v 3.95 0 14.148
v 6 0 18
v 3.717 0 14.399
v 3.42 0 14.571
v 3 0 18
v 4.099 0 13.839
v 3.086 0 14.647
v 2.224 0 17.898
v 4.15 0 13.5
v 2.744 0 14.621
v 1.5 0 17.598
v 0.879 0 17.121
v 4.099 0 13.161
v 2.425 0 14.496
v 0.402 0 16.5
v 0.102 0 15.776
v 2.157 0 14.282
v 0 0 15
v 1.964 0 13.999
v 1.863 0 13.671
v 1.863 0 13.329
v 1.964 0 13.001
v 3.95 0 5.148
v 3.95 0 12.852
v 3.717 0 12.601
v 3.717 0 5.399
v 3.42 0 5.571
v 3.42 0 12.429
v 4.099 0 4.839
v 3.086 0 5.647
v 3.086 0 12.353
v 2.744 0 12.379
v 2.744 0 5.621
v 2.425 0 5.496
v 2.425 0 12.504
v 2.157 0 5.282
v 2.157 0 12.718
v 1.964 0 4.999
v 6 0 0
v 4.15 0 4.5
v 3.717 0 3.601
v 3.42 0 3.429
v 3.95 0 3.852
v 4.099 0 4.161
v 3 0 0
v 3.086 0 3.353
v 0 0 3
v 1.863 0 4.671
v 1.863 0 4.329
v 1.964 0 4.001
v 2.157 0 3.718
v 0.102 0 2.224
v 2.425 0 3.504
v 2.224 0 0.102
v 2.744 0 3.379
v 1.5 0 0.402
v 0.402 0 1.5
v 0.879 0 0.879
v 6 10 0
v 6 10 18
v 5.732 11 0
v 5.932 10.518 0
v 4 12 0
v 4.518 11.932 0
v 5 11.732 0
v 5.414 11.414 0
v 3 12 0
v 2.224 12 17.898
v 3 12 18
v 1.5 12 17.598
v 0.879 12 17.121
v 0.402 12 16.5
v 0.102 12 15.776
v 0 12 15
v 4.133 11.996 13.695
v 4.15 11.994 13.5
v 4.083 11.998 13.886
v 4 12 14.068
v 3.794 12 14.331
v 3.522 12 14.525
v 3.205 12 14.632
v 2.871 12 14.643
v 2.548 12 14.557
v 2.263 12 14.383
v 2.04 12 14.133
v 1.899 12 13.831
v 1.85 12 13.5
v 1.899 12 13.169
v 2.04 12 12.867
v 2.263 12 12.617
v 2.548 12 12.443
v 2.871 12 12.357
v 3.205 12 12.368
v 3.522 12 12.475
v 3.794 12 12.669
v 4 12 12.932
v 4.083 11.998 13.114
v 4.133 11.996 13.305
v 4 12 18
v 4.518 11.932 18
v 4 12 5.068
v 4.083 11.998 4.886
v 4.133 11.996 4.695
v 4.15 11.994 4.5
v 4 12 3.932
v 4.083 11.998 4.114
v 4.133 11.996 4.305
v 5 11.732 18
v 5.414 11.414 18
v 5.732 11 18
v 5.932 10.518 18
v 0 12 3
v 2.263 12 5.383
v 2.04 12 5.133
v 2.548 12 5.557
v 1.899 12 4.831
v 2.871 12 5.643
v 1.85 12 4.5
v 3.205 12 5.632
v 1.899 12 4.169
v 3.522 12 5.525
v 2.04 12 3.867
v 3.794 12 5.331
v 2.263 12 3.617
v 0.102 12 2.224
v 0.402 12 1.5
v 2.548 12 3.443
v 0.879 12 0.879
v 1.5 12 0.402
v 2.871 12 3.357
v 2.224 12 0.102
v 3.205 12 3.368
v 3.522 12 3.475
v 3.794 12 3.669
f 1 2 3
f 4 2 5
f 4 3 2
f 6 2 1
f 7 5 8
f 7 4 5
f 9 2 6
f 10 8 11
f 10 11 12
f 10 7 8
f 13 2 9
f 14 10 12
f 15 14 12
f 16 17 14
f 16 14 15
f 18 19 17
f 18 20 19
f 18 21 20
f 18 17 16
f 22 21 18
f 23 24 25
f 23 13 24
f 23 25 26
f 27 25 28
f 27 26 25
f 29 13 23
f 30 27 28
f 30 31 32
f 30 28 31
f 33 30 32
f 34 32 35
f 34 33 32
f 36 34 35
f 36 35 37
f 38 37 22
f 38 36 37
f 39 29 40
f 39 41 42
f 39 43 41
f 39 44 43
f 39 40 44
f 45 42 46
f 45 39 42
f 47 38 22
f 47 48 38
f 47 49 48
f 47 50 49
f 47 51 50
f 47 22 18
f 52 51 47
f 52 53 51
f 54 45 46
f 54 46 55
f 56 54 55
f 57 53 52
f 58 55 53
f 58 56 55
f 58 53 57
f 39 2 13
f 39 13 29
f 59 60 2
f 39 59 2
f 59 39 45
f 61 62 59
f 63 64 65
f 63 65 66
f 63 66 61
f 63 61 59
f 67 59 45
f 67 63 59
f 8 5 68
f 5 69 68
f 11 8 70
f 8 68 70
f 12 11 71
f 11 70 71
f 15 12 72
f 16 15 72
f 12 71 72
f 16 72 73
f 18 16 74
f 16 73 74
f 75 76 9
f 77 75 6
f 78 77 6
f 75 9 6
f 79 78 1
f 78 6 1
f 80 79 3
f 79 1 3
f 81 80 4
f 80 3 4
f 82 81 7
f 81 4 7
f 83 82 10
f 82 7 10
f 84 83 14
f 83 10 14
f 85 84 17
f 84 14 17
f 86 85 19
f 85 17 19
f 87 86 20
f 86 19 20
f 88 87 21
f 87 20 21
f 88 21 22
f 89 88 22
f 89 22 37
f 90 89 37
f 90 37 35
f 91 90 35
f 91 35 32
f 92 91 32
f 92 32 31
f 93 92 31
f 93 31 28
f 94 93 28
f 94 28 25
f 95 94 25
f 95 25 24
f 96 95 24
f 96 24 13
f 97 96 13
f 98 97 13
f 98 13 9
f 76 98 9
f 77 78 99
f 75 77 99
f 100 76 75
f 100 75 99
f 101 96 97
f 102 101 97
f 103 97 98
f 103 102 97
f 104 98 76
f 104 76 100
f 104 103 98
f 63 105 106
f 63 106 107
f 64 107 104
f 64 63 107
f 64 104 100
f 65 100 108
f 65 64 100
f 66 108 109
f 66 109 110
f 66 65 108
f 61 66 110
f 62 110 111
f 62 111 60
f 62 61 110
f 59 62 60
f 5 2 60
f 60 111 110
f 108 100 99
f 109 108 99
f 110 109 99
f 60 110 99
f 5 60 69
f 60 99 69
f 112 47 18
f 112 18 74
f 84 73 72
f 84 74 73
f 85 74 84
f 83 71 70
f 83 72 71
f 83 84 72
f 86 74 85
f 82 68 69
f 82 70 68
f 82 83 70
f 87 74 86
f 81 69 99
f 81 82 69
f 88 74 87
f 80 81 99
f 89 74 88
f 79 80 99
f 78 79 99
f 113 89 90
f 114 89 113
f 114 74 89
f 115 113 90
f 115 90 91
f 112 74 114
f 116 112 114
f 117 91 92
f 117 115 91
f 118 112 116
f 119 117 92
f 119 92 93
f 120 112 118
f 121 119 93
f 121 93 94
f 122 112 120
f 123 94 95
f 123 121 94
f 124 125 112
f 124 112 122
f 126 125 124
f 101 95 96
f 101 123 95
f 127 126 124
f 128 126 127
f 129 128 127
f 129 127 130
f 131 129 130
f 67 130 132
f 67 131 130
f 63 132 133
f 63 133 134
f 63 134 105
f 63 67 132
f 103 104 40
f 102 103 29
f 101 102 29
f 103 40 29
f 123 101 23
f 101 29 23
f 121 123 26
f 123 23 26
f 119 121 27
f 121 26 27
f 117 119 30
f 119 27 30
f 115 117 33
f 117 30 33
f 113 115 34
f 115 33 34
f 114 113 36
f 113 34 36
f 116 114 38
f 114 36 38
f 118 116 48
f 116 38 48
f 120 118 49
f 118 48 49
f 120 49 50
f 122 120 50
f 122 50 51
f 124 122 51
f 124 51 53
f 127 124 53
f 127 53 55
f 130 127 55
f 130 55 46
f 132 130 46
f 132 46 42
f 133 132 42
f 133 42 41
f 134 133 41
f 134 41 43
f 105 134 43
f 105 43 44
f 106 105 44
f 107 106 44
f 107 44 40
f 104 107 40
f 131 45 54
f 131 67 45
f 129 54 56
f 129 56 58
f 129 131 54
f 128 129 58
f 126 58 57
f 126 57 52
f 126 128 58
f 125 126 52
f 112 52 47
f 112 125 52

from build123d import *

# Parameters (mm, degrees)
EXTRUDE_1_DEPTH     = 18
SKETCH_2_R          = 1.15
CUT_EXTRUDE_1_DEPTH = 16
FILLET_1_R          = 3


with BuildPart() as part:
    # 草图1 → 凸台-拉伸1 (new body)
    with BuildSketch(Plane.XY):
        with BuildLine():
            Line((6, 0), (0, 0))
            Line((0, 0), (0, 12))
            Line((0, 12), (4, 12))
            ThreePointArc((4, 12), (5.414213562, 11.414213562), (6, 10))
            Line((6, 10), (6, 0))
        make_face()
    extrude(amount=EXTRUDE_1_DEPTH)

    # 草图2 → 切除-拉伸1 (cut)
    with BuildSketch(Plane.XZ):
        with Locations((3, 13.5)):
            Circle(SKETCH_2_R)
        with Locations((3, 4.5)):
            Circle(SKETCH_2_R)
    extrude(amount=-CUT_EXTRUDE_1_DEPTH, mode=Mode.SUBTRACT)

    # 圆角1
    fillet_1_edges = [part.edges().sort_by_distance(p)[0] for p in [
        (0, 6, 18),
        (0, 6, 0),
    ]]
    fillet(fillet_1_edges, radius=FILLET_1_R)


solid = part.part
